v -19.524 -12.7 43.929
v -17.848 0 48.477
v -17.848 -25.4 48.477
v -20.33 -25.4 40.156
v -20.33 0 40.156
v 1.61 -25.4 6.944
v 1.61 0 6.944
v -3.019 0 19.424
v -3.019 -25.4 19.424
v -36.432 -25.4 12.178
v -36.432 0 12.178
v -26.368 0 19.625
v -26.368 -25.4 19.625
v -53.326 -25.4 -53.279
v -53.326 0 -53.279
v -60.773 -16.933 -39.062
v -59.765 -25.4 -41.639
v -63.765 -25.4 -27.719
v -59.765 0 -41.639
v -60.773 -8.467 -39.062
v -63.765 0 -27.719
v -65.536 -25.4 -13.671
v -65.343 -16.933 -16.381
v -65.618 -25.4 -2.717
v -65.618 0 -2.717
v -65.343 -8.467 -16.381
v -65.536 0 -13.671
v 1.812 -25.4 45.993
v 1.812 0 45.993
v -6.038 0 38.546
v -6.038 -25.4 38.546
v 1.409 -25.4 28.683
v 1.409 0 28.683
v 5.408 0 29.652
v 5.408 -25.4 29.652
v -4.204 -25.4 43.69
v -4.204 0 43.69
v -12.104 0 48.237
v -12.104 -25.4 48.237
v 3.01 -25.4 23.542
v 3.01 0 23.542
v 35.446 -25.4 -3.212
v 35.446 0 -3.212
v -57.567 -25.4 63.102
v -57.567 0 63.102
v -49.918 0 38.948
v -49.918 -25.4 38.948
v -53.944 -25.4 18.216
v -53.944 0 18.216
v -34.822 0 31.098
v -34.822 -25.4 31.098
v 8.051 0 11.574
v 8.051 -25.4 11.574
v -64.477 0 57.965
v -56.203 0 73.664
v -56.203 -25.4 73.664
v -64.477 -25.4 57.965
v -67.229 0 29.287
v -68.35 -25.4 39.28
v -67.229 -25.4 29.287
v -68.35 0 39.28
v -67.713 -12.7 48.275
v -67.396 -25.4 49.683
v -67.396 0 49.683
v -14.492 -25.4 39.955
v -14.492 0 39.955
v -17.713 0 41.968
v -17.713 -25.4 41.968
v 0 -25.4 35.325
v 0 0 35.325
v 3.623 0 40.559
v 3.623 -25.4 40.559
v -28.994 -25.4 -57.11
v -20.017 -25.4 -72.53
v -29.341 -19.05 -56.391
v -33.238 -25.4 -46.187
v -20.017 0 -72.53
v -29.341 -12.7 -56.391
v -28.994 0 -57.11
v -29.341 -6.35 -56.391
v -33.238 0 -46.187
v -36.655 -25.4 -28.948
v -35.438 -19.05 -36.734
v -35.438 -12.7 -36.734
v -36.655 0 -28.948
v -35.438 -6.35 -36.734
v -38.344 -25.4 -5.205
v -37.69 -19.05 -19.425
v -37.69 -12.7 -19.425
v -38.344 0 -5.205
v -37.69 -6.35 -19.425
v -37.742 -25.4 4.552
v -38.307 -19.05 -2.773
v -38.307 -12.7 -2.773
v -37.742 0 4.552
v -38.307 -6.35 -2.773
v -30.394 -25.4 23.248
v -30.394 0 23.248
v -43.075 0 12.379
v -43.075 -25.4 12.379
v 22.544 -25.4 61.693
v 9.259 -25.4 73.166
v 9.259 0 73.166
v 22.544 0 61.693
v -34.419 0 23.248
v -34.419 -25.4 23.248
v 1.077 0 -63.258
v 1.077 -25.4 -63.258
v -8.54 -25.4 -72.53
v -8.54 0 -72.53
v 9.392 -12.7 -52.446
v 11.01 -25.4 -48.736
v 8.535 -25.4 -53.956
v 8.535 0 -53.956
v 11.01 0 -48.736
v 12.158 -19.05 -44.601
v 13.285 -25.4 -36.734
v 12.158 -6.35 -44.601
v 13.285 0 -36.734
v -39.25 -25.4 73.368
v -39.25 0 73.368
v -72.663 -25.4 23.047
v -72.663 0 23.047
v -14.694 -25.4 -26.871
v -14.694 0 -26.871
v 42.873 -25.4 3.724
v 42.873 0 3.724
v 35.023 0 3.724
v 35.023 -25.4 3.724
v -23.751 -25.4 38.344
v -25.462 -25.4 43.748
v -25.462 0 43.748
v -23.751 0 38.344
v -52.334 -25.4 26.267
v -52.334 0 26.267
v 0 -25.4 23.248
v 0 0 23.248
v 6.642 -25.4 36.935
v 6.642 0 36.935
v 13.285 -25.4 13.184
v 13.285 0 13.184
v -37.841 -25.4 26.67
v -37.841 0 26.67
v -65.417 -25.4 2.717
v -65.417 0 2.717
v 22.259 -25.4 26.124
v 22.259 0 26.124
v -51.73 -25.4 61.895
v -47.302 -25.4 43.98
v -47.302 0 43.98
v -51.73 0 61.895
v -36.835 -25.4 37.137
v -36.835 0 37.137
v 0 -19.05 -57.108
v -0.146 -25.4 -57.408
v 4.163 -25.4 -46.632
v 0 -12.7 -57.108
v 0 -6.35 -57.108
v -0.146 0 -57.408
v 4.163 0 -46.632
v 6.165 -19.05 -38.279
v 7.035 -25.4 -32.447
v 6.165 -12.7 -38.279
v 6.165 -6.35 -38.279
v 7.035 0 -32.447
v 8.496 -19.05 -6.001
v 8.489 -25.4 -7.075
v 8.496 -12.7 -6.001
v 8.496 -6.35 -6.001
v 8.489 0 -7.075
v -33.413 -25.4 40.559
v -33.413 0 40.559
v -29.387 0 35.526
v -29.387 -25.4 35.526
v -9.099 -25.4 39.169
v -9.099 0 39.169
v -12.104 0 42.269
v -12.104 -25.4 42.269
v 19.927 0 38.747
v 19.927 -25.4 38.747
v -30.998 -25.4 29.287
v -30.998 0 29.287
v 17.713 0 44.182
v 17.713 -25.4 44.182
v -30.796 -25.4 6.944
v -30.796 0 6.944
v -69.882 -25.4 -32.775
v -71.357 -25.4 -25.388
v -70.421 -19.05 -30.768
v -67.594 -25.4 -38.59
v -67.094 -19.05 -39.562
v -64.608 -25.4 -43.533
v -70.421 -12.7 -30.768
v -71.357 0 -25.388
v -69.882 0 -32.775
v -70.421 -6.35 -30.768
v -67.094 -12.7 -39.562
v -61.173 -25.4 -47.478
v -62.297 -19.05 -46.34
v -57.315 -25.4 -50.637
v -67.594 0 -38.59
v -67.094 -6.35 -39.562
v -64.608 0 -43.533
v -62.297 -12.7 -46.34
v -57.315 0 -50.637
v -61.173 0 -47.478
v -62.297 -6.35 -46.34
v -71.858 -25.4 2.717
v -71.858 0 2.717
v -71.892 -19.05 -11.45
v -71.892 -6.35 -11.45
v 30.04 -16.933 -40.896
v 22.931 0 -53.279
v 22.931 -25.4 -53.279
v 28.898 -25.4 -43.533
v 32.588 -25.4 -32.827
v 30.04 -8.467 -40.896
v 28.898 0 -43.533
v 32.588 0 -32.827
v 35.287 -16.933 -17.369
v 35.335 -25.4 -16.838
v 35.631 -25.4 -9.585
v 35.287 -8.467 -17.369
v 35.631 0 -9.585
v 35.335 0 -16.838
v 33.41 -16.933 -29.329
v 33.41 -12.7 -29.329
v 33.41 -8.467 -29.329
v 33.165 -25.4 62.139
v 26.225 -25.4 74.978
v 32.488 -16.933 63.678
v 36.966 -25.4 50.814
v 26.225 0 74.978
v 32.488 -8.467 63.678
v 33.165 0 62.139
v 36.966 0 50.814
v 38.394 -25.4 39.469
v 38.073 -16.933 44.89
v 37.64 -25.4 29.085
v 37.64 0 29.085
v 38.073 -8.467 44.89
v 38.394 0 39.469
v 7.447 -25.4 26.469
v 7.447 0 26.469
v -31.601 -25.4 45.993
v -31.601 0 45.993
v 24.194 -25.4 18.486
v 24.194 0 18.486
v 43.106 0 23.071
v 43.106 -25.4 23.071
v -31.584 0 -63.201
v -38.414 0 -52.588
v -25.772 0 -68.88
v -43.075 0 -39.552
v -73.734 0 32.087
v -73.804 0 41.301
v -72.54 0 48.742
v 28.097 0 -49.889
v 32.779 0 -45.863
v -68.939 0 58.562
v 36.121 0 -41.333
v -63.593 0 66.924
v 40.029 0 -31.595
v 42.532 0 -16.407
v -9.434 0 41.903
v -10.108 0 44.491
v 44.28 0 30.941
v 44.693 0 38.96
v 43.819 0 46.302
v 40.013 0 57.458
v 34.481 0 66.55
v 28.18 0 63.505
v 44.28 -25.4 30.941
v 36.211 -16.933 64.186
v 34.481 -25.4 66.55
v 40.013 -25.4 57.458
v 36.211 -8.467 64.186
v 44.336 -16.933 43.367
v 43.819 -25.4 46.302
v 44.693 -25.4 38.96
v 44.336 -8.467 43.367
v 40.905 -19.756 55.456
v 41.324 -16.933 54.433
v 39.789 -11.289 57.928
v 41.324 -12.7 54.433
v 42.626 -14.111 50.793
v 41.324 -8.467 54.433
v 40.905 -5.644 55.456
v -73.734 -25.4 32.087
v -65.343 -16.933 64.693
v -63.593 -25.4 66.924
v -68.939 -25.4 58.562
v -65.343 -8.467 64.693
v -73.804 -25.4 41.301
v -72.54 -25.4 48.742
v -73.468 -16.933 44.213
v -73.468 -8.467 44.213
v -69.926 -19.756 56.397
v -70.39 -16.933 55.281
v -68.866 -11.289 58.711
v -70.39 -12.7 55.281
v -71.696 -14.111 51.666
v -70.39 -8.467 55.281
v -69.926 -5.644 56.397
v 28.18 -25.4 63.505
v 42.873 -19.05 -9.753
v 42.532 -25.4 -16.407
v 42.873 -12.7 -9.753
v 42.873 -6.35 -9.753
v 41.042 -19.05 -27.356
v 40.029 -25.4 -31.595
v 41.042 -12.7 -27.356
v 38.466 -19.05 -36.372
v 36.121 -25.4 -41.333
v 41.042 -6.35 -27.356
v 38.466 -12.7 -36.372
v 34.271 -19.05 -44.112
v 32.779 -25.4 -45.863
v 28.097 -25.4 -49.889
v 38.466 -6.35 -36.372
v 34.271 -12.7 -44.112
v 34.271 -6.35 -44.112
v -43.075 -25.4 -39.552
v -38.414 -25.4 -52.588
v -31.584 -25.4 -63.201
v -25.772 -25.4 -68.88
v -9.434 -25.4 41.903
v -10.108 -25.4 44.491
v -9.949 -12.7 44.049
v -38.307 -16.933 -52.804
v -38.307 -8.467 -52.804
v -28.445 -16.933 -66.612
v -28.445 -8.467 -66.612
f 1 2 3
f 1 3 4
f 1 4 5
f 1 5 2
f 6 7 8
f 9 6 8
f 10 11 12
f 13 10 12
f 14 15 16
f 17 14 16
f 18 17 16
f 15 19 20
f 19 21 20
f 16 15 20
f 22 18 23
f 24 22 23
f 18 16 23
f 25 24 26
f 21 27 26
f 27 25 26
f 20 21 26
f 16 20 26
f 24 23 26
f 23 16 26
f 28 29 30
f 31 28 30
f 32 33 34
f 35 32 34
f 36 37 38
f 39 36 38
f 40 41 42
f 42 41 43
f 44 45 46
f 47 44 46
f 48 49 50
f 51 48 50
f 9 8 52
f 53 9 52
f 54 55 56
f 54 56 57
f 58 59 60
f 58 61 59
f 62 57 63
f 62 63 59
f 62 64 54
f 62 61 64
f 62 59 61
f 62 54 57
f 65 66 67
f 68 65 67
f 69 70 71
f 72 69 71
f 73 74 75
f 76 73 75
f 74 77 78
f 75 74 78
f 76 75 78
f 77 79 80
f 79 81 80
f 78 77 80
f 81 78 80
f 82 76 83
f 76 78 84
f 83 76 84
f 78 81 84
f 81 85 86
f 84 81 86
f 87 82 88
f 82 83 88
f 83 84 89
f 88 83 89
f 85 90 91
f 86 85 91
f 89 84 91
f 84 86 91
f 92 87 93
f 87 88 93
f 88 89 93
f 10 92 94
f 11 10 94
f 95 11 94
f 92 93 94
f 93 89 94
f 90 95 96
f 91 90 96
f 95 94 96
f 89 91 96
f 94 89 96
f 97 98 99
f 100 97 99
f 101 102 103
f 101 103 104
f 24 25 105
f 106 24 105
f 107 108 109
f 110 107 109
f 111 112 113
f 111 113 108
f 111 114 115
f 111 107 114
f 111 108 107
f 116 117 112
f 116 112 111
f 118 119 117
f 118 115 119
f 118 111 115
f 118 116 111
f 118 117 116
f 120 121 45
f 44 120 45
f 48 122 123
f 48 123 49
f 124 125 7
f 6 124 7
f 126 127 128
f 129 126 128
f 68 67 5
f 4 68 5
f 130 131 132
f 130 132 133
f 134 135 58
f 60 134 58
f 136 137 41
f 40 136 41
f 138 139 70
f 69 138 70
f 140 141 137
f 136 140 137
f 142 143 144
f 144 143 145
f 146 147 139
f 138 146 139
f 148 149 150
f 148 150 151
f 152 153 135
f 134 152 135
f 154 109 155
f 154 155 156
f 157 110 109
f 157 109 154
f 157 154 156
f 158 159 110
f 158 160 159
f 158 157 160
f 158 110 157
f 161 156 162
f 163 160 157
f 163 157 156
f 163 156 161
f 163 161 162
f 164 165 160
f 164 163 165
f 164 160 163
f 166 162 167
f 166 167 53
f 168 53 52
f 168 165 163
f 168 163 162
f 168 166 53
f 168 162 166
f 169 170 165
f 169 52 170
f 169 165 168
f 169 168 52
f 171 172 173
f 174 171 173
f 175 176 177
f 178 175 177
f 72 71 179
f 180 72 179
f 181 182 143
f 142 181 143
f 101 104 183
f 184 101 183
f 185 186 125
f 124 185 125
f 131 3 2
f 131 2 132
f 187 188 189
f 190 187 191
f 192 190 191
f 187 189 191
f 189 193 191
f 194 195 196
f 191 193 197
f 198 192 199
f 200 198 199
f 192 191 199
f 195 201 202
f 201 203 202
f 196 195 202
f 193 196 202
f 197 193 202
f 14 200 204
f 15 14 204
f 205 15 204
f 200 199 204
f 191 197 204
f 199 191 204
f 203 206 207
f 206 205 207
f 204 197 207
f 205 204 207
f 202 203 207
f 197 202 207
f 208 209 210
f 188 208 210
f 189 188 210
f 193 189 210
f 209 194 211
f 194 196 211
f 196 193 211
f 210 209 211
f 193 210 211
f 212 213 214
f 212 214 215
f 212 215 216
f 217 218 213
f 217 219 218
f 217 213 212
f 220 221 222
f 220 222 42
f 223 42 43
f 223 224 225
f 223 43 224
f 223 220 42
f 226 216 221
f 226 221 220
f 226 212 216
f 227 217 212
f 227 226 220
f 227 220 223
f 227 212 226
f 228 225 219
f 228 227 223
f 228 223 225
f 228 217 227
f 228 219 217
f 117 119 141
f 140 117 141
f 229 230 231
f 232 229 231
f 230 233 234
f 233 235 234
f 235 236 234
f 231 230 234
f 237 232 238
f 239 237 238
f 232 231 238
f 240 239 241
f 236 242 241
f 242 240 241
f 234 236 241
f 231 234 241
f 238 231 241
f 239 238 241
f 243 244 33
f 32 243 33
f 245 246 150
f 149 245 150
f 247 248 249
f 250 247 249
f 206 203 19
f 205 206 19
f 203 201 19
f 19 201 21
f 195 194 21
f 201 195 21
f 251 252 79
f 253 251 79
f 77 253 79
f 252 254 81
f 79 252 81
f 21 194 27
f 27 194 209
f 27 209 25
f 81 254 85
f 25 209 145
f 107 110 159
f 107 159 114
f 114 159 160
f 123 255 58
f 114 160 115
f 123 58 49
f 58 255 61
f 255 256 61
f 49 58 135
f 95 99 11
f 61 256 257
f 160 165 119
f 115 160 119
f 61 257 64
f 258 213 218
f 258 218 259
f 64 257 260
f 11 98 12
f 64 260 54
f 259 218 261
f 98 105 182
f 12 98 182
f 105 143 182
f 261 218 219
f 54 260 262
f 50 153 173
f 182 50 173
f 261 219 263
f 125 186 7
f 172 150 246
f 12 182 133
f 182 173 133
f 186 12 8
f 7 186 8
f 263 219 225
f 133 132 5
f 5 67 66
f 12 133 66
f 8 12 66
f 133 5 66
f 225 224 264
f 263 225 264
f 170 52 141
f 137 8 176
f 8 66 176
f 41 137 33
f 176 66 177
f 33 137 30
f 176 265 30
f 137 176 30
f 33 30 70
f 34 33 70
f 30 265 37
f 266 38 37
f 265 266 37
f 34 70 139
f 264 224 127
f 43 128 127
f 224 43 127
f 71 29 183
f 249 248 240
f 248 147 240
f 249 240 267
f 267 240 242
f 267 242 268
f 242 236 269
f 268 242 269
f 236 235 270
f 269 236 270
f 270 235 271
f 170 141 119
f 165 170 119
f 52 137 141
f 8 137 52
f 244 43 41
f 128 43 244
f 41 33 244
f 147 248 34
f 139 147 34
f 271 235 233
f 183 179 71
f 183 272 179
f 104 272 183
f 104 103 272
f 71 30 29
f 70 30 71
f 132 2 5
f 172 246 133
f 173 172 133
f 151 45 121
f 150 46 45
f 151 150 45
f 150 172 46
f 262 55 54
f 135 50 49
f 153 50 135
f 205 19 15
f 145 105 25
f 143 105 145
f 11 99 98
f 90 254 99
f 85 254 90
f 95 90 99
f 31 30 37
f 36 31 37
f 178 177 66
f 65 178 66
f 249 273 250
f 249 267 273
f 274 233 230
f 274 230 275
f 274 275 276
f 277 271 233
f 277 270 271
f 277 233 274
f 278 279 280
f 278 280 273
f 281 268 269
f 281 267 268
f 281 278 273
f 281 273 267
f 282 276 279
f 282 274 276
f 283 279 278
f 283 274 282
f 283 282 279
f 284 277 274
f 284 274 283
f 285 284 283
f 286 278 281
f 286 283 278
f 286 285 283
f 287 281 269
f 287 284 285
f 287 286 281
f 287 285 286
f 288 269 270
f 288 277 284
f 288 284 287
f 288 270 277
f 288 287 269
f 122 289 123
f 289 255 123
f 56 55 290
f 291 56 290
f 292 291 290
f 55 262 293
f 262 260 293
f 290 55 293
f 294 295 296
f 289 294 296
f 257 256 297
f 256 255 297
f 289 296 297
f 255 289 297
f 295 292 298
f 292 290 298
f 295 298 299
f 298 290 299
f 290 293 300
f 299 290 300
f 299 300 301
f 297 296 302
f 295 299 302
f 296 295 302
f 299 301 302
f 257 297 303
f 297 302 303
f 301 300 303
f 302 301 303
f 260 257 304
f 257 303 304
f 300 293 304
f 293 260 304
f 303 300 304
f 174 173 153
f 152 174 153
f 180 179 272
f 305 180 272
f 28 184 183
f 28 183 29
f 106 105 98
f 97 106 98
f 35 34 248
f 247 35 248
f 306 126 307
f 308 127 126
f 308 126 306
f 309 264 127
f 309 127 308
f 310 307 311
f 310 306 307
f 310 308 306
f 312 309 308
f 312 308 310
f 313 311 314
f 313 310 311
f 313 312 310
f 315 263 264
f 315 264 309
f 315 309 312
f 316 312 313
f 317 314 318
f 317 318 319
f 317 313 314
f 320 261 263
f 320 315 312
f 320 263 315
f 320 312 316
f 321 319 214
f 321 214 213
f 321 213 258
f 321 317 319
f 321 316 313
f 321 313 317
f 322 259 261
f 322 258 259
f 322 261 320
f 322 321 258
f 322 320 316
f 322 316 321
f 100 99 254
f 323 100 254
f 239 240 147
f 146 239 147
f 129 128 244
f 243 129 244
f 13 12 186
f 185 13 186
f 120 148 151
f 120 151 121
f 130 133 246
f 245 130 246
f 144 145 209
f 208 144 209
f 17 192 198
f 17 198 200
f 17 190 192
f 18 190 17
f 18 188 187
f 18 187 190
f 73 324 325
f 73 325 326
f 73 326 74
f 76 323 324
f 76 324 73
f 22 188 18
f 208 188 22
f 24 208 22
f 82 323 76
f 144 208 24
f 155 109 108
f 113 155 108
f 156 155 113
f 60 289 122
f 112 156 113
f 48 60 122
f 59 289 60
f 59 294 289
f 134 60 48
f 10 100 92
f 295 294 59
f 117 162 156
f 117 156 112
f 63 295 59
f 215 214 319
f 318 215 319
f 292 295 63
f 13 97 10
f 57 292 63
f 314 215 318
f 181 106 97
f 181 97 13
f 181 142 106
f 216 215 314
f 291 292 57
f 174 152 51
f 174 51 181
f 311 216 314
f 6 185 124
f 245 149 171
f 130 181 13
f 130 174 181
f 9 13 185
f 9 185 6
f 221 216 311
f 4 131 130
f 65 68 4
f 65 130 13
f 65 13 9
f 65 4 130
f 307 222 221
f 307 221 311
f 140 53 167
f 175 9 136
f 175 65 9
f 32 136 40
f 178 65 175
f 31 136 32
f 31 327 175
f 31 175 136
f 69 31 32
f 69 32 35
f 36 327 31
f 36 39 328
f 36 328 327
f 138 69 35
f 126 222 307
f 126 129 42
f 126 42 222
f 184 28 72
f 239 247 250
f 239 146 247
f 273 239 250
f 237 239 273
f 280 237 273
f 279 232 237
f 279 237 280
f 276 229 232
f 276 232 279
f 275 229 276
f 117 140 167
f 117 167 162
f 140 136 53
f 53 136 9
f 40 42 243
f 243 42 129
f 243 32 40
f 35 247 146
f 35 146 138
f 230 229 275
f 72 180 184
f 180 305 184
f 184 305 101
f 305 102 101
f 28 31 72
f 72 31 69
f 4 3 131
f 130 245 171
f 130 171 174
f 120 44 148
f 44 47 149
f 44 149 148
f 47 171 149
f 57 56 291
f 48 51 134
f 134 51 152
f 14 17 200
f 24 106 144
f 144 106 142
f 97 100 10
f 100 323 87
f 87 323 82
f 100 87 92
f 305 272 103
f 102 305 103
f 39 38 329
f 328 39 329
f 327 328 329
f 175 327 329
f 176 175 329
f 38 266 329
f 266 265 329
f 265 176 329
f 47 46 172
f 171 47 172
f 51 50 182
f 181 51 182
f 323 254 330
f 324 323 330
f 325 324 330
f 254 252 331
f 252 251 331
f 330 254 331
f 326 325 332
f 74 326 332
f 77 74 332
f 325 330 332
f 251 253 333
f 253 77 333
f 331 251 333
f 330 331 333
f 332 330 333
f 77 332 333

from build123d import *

# Parameters (mm, degrees)
F1_DEPTH = 25.4


with BuildPart() as f1:
    # F0 (on Front) → F1 (new body)
    with BuildSketch(Plane.XZ):
        with BuildLine():
            Line((-36.4322289824, 12.1776238084), (-26.3680759817, 19.6250956506))
            Line((-26.3680759817, 19.6250956506), (-30.7963024825, 6.9442642853))
            Line((-30.7963024825, 6.9442642853), (-14.6936606616, -26.8712826073))
            Line((-14.6936606616, -26.8712826073), (1.6102636, 6.9442642853))
            Line((1.6102636, 6.9442642853), (-3.0192458071, 19.4238107651))
            Line((-3.0192458071, 19.4238107651), (8.0513199791, 11.5737747401))
            add(Edge.make_bspline(
                [(-8.539903909, -72.529733181), (-5.5298175025, -67.4291319873), (0.671369104, -56.9212011388), (7.5010896056, -38.6584394427), (8.8485062582, -6.0565384462), (8.2888064124, 6.3216018094), (8.0513199791, 11.5737747401)],
                knots=[0, 0, 0, 0, 0.2265678753, 0.466760579, 0.7737409987, 1, 1, 1, 1], degree=3))
            add(Edge.make_bspline(
                [(13.2846795022, -36.7341525853), (12.7159700105, -41.9814211739), (11.4137758116, -53.9962772925), (-1.3503029933, -65.8518595611), (-8.539903909, -72.529733181)],
                knots=[0, 0, 0, 0, 0.4367317042, 1, 1, 1, 1], degree=3))
            Line((13.2846795022, -36.7341525853), (13.2846795022, 13.1840375252))
            Line((13.2846795022, 13.1840375252), (0, 23.2481881976))
            Line((0, 23.2481881976), (3.0102304372, 23.5418692159))
            Line((3.0102304372, 23.5418692159), (35.4457411612, -3.2115069692))
            add(Edge.make_bspline(
                [(22.9310896248, -53.2794632018), (25.4561163969, -49.6894712594), (31.2619106567, -41.435002498), (36.0497072594, -17.3833263421), (35.6284960933, -7.4997772809), (35.4457411612, -3.2115069692)],
                knots=[0, 0, 0, 0, 0.3034813899, 0.6977947842, 1, 1, 1, 1], degree=3))
            add(Edge.make_bspline(
                [(42.8732857108, 3.7237356883), (42.9419768966, -0.6242385053), (43.089385872, -9.9548449559), (41.8552231799, -27.387745044), (35.8065129434, -45.2180128452), (27.0667549953, -50.6900756336), (22.9310896248, -53.2794632018)],
                knots=[0, 0, 0, 0, 0.2301910986, 0.4939823591, 0.7605517628, 1, 1, 1, 1], degree=3))
            Line((42.8732857108, 3.7237356883), (35.0232459605, 3.7237356883))
            Line((35.0232459605, 3.7237356883), (7.4474713765, 26.4687165618))
            Line((7.4474713765, 26.4687165618), (1.4089808101, 28.6828298122))
            Line((1.4089808101, 28.6828298122), (5.4076748606, 29.6522101201))
            Line((5.4076748606, 29.6522101201), (24.194162339, 18.4860005975))
            Line((24.194162339, 18.4860005975), (43.106447074, 23.0707965754))
            add(Edge.make_bspline(
                [(26.2252576649, 74.9779269099), (29.6698417944, 71.8623759308), (37.3610362325, 64.9058588415), (46.4578230677, 43.2829715579), (44.2058474785, 29.7012890641), (43.106447074, 23.0707965754)],
                knots=[0, 0, 0, 0, 0.293358708, 0.6550221388, 1, 1, 1, 1], degree=3))
            add(Edge.make_bspline(
                [(26.2252576649, 74.9779269099), (28.3474149897, 71.5501339246), (33.0834738819, 63.9002630792), (39.3930720831, 44.8851357539), (38.203019559, 34.160136648), (37.6399233937, 29.0853977203)],
                knots=[0, 0, 0, 0, 0.2995825373, 0.6685840504, 1, 1, 1, 1], degree=3))
            Line((37.6399233937, 29.0853977203), (22.2586813173, 26.1241192863))
            Line((22.2586813173, 26.1241192863), (6.6423402168, 36.9354337454))
            Line((6.6423402168, 36.9354337454), (0, 35.3251695633))
            Line((0, 35.3251695633), (3.6230948754, 40.5585281551))
            Line((3.6230948754, 40.5585281551), (19.9270192534, 38.7469828129))
            Line((19.9270192534, 38.7469828129), (28.1796231866, 63.5047927499))
            Line((28.1796231866, 63.5047927499), (9.2590199783, 73.1663778424))
            Line((9.2590199783, 73.1663778424), (22.5436985493, 61.6932436824))
            Line((22.5436985493, 61.6932436824), (17.7129078656, 44.1816225648))
            Line((17.7129078656, 44.1816225648), (1.8115479033, 45.993167907))
            Line((1.8115479033, 45.993167907), (-6.0384911485, 38.5456979275))
            Line((-6.0384911485, 38.5456979275), (-4.204464145, 43.6895005405))
            Line((-4.204464145, 43.6895005405), (-12.1035818011, 48.2374802232))
            add(Edge.make_bspline(
                [(-12.1035818011, 48.2374802232), (-11.2764509271, 46.8880557358), (-9.6011168855, 44.1548283208), (-9.2676791017, 40.8445549043), (-9.0988632253, 39.1685999437)],
                knots=[0, 0, 0, 0, 0.4937110172, 1, 1, 1, 1], degree=3))
            Line((-9.0988632253, 39.1685999437), (-12.1035818011, 42.2694329172))
            Line((-12.1035818011, 42.2694329172), (-14.4923776388, 39.9546809494))
            Line((-14.4923776388, 39.9546809494), (-17.712906003, 41.9675111771))
            Line((-17.712906003, 41.9675111771), (-20.3295852989, 40.1559621096))
            add(Edge.make_bspline(
                [(-17.8483948112, 48.476845026), (-18.4749692932, 46.9327465619), (-19.6605585437, 44.0110403751), (-20.115212391, 41.3912256195), (-20.3295852989, 40.1559621096)],
                knots=[0, 0, 0, 0, 0.5284920404, 1, 1, 1, 1], degree=3))
            Line((-17.8483948112, 48.476845026), (-25.4624815705, 43.7478435523))
            Line((-25.4624815705, 43.7478435523), (-23.7513966858, 38.3444167674))
            Line((-23.7513966858, 38.3444167674), (-31.6014327109, 45.993167907))
            Line((-31.6014327109, 45.993167907), (-47.3015084863, 43.9803414047))
            Line((-47.3015084863, 43.9803414047), (-51.729734987, 61.8945285678))
            Line((-51.729734987, 61.8945285678), (-39.2501913011, 73.3676627278))
            Line((-39.2501913011, 73.3676627278), (-57.5669445097, 63.1022304296))
            Line((-57.5669445097, 63.1022304296), (-49.9181896448, 38.948263973))
            Line((-49.9181896448, 38.948263973), (-33.4129817784, 40.5585281551))
            Line((-33.4129817784, 40.5585281551), (-29.3873213232, 35.5264544487))
            Line((-29.3873213232, 35.5264544487), (-36.8347913027, 37.1367186308))
            Line((-36.8347913027, 37.1367186308), (-52.3335859179, 26.267433539))
            Line((-52.3335859179, 26.267433539), (-67.2285333276, 29.2866788805))
            add(Edge.make_bspline(
                [(-56.2034733593, 73.6641660333), (-61.1444043649, 64.9834714788), (-70.1639673597, 49.1370507769), (-68.1425947811, 35.4678635333), (-67.2285333276, 29.2866788805)],
                knots=[0, 0, 0, 0, 0.5478015962, 1, 1, 1, 1], degree=3))
            add(Edge.make_bspline(
                [(-56.2034733593, 73.6641660333), (-59.3451927185, 71.1733267977), (-66.60773384, 65.4153897232), (-75.5386939948, 43.9944008325), (-73.6153653527, 29.9834038748), (-72.6631730795, 23.0469070375)],
                knots=[0, 0, 0, 0, 0.2779550238, 0.6425334536, 1, 1, 1, 1], degree=3))
            Line((-72.6631730795, 23.0469070375), (-53.9438501, 18.2161126286))
            Line((-53.9438501, 18.2161126286), (-34.8219648004, 31.0982260853))
            Line((-34.8219648004, 31.0982260853), (-30.9975855052, 29.2866788805))
            Line((-30.9975855052, 29.2866788805), (-37.8412082791, 26.6700014472))
            Line((-37.8412082791, 26.6700014472), (-65.4169842601, 2.7173208073))
            Line((-65.4169842601, 2.7173208073), (-71.8580409884, 2.7173208073))
            add(Edge.make_bspline(
                [(-71.8580409884, 2.7173208073), (-71.8323808051, -0.6743290469), (-71.7707586489, -8.819273873), (-72.3514628162, -31.1556090613), (-63.3168519567, -46.9122797723), (-56.4054375512, -51.3169694206), (-53.3260814846, -53.2794632018)],
                knots=[0, 0, 0, 0, 0.2151105122, 0.5165814068, 0.784614568, 1, 1, 1, 1], degree=3))
            add(Edge.make_bspline(
                [(-53.3260814846, -53.2794632018), (-56.0259363166, -49.0184463117), (-61.9673181702, -39.6415242162), (-65.9171343123, -16.4717993255), (-65.7087984168, -6.8839300031), (-65.6182616949, -2.7173208073)],
                knots=[0, 0, 0, 0, 0.3201642849, 0.7045631676, 1, 1, 1, 1], degree=3))
            Line((-65.6182616949, -2.7173208073), (-34.4193968922, 23.2481881976))
            Line((-34.4193968922, 23.2481881976), (-30.393736437, 23.2481881976))
            Line((-30.393736437, 23.2481881976), (-43.0745668709, 12.3789058998))
            Line((-43.0745668709, 12.3789058998), (-43.0745668709, -39.5521149039))
            add(Edge.make_bspline(
                [(-43.0745668709, -39.5521149039), (-41.8262985236, -43.8907788266), (-39.2078569373, -52.9918171315), (-29.1900934235, -67.2654171685), (-22.8102743449, -70.9265355416), (-20.0165621936, -72.529733181)],
                knots=[0, 0, 0, 0, 0.3386642474, 0.7104021751, 1, 1, 1, 1], degree=3))
            add(Edge.make_bspline(
                [(-20.0165621936, -72.529733181), (-23.3797839012, -67.1871365793), (-30.2770206692, -56.2306320954), (-36.3841217142, -37.273284048), (-39.4008360571, -2.9353787105), (-37.2794445977, 7.8644993682), (-36.4322289824, 12.1776238084)],
                knots=[0, 0, 0, 0, 0.2324437246, 0.4766915604, 0.7910074166, 1, 1, 1, 1], degree=3))
        make_face()
    extrude(amount=F1_DEPTH)


solid = f1.part
